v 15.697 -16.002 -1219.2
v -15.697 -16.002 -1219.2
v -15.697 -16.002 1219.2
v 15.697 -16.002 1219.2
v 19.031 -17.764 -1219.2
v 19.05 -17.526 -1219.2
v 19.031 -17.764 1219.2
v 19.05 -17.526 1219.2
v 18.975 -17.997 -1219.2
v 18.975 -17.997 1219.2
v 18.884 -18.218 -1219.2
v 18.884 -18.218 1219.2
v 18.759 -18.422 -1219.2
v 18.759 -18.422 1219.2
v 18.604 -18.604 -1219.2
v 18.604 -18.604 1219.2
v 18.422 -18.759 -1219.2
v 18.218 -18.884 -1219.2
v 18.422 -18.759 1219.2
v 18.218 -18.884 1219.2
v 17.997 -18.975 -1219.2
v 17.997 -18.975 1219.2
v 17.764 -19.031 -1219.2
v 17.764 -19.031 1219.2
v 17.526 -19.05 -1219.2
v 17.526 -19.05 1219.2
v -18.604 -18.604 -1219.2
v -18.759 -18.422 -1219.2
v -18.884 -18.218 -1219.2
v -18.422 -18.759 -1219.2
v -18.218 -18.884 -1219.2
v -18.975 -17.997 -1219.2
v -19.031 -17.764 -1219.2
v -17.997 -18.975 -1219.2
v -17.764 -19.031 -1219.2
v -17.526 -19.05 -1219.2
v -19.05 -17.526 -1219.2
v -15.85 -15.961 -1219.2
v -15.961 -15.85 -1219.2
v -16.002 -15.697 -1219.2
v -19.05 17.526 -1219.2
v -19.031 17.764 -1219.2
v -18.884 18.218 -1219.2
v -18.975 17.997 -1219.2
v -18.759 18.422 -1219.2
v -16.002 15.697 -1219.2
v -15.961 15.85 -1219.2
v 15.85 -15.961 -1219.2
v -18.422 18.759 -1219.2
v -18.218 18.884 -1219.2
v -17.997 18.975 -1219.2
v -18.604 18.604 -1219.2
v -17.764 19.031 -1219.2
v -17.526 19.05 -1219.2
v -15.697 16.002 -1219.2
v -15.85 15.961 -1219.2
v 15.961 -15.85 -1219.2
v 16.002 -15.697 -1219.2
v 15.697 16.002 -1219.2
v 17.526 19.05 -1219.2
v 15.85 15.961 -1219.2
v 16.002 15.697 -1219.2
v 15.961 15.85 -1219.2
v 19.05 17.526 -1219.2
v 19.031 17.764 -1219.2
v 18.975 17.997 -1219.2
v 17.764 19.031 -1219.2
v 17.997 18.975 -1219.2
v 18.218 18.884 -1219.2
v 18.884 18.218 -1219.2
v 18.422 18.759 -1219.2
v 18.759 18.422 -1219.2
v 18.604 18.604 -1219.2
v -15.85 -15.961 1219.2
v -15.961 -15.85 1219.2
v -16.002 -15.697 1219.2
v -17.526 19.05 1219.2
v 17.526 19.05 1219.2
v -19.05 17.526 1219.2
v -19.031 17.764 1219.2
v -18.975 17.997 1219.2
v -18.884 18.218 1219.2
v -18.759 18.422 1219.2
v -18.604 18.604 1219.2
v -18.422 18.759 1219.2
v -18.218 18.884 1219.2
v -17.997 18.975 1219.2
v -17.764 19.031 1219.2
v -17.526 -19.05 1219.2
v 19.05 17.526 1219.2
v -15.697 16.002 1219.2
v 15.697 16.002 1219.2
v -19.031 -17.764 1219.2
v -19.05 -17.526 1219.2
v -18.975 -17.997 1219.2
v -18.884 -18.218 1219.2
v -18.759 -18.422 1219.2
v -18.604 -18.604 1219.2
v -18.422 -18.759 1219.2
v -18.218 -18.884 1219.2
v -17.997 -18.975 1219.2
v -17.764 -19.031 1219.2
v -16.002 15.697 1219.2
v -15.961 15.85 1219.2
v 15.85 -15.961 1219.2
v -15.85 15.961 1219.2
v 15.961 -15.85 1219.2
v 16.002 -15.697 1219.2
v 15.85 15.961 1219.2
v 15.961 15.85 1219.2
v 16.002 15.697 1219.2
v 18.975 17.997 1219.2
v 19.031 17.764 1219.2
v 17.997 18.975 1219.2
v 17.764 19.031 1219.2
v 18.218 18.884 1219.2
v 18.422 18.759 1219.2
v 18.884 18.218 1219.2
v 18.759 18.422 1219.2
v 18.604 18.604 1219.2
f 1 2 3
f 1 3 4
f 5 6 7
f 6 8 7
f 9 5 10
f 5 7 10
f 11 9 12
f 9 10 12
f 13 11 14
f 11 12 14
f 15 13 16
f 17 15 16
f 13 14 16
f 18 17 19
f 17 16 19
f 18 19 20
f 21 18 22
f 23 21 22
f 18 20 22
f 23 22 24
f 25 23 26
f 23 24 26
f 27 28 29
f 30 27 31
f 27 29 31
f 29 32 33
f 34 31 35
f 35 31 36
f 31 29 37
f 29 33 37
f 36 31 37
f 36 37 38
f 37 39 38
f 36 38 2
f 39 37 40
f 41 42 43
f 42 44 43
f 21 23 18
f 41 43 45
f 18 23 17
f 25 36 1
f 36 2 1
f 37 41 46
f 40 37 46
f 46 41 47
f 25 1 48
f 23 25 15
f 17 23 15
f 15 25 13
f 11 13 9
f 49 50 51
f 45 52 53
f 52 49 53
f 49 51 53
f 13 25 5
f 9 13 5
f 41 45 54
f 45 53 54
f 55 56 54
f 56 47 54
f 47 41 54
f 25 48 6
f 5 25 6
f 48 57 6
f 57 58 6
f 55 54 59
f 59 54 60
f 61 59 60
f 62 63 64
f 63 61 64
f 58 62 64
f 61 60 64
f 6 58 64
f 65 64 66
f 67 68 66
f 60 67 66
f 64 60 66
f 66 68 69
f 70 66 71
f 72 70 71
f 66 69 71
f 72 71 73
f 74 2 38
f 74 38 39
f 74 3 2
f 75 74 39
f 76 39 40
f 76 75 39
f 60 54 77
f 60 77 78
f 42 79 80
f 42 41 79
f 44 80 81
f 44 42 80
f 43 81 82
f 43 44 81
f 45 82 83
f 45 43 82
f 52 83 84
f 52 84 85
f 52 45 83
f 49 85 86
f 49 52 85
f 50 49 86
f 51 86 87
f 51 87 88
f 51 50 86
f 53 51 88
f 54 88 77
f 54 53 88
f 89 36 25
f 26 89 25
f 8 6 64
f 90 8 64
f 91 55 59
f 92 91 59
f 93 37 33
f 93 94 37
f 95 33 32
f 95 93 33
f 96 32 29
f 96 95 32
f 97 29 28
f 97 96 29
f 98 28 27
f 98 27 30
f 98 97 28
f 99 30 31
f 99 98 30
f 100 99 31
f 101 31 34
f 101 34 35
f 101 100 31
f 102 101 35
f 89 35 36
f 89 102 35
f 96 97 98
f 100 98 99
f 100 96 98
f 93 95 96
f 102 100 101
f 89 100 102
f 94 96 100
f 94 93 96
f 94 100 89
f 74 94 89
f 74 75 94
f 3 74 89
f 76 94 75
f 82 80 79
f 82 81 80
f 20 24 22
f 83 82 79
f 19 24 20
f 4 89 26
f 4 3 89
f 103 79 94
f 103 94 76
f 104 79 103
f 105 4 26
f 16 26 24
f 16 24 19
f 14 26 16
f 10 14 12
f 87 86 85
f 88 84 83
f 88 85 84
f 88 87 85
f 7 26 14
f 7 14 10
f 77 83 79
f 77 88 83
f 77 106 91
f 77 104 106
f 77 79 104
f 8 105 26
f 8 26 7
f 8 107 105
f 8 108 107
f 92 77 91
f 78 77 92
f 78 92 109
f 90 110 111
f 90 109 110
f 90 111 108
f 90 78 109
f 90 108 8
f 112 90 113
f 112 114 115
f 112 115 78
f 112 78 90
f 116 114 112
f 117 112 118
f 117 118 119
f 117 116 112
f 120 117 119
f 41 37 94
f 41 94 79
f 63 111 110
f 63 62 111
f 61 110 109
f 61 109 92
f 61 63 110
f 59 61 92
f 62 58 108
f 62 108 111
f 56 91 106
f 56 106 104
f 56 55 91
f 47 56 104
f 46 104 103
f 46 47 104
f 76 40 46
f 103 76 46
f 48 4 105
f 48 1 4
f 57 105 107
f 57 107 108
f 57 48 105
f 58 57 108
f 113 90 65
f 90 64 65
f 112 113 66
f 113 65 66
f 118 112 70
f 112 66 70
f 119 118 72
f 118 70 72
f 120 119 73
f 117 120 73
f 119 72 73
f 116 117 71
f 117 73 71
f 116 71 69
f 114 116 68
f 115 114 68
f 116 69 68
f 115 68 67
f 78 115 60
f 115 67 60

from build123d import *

# Parameters (mm, degrees)
SKETCH3_W                = 38.1
SKETCH3_H                = 38.1
SKETCH3_W_2              = 32.004
SKETCH3_H_2              = 32.004
BOSS_EXTRUDE1_DEPTH      = 1219.2
BOSS_EXTRUDE1_DEPTH_BACK = 1219.2
FILLET1_R                = 1.524
FILLET2_R                = 0.3048


with BuildPart() as part:
    # Sketch3 → Boss-Extrude1 (new body, two sides)
    with BuildSketch(Plane.XY) as boss_extrude1_sk:
        Rectangle(SKETCH3_W, SKETCH3_H)
        Rectangle(SKETCH3_W_2, SKETCH3_H_2, mode=Mode.SUBTRACT)
    extrude(amount=BOSS_EXTRUDE1_DEPTH)
    extrude(boss_extrude1_sk.sketch, amount=-BOSS_EXTRUDE1_DEPTH_BACK)

    # Fillet1
    fillet1_edges = [part.edges().sort_by_distance(p)[0] for p in [
        (-19.05, -19.05, 0),
        (-19.05, 19.05, 0),
        (19.05, 19.05, 0),
        (19.05, -19.05, 0),
    ]]
    fillet(fillet1_edges, radius=FILLET1_R)

    # Fillet2
    fillet2_edges = [part.edges().sort_by_distance(p)[0] for p in [
        (-16.002, -16.002, 0),
        (16.002, -16.002, 0),
        (16.002, 16.002, 0),
        (-16.002, 16.002, 0),
    ]]
    fillet(fillet2_edges, radius=FILLET2_R)


solid = part.part
